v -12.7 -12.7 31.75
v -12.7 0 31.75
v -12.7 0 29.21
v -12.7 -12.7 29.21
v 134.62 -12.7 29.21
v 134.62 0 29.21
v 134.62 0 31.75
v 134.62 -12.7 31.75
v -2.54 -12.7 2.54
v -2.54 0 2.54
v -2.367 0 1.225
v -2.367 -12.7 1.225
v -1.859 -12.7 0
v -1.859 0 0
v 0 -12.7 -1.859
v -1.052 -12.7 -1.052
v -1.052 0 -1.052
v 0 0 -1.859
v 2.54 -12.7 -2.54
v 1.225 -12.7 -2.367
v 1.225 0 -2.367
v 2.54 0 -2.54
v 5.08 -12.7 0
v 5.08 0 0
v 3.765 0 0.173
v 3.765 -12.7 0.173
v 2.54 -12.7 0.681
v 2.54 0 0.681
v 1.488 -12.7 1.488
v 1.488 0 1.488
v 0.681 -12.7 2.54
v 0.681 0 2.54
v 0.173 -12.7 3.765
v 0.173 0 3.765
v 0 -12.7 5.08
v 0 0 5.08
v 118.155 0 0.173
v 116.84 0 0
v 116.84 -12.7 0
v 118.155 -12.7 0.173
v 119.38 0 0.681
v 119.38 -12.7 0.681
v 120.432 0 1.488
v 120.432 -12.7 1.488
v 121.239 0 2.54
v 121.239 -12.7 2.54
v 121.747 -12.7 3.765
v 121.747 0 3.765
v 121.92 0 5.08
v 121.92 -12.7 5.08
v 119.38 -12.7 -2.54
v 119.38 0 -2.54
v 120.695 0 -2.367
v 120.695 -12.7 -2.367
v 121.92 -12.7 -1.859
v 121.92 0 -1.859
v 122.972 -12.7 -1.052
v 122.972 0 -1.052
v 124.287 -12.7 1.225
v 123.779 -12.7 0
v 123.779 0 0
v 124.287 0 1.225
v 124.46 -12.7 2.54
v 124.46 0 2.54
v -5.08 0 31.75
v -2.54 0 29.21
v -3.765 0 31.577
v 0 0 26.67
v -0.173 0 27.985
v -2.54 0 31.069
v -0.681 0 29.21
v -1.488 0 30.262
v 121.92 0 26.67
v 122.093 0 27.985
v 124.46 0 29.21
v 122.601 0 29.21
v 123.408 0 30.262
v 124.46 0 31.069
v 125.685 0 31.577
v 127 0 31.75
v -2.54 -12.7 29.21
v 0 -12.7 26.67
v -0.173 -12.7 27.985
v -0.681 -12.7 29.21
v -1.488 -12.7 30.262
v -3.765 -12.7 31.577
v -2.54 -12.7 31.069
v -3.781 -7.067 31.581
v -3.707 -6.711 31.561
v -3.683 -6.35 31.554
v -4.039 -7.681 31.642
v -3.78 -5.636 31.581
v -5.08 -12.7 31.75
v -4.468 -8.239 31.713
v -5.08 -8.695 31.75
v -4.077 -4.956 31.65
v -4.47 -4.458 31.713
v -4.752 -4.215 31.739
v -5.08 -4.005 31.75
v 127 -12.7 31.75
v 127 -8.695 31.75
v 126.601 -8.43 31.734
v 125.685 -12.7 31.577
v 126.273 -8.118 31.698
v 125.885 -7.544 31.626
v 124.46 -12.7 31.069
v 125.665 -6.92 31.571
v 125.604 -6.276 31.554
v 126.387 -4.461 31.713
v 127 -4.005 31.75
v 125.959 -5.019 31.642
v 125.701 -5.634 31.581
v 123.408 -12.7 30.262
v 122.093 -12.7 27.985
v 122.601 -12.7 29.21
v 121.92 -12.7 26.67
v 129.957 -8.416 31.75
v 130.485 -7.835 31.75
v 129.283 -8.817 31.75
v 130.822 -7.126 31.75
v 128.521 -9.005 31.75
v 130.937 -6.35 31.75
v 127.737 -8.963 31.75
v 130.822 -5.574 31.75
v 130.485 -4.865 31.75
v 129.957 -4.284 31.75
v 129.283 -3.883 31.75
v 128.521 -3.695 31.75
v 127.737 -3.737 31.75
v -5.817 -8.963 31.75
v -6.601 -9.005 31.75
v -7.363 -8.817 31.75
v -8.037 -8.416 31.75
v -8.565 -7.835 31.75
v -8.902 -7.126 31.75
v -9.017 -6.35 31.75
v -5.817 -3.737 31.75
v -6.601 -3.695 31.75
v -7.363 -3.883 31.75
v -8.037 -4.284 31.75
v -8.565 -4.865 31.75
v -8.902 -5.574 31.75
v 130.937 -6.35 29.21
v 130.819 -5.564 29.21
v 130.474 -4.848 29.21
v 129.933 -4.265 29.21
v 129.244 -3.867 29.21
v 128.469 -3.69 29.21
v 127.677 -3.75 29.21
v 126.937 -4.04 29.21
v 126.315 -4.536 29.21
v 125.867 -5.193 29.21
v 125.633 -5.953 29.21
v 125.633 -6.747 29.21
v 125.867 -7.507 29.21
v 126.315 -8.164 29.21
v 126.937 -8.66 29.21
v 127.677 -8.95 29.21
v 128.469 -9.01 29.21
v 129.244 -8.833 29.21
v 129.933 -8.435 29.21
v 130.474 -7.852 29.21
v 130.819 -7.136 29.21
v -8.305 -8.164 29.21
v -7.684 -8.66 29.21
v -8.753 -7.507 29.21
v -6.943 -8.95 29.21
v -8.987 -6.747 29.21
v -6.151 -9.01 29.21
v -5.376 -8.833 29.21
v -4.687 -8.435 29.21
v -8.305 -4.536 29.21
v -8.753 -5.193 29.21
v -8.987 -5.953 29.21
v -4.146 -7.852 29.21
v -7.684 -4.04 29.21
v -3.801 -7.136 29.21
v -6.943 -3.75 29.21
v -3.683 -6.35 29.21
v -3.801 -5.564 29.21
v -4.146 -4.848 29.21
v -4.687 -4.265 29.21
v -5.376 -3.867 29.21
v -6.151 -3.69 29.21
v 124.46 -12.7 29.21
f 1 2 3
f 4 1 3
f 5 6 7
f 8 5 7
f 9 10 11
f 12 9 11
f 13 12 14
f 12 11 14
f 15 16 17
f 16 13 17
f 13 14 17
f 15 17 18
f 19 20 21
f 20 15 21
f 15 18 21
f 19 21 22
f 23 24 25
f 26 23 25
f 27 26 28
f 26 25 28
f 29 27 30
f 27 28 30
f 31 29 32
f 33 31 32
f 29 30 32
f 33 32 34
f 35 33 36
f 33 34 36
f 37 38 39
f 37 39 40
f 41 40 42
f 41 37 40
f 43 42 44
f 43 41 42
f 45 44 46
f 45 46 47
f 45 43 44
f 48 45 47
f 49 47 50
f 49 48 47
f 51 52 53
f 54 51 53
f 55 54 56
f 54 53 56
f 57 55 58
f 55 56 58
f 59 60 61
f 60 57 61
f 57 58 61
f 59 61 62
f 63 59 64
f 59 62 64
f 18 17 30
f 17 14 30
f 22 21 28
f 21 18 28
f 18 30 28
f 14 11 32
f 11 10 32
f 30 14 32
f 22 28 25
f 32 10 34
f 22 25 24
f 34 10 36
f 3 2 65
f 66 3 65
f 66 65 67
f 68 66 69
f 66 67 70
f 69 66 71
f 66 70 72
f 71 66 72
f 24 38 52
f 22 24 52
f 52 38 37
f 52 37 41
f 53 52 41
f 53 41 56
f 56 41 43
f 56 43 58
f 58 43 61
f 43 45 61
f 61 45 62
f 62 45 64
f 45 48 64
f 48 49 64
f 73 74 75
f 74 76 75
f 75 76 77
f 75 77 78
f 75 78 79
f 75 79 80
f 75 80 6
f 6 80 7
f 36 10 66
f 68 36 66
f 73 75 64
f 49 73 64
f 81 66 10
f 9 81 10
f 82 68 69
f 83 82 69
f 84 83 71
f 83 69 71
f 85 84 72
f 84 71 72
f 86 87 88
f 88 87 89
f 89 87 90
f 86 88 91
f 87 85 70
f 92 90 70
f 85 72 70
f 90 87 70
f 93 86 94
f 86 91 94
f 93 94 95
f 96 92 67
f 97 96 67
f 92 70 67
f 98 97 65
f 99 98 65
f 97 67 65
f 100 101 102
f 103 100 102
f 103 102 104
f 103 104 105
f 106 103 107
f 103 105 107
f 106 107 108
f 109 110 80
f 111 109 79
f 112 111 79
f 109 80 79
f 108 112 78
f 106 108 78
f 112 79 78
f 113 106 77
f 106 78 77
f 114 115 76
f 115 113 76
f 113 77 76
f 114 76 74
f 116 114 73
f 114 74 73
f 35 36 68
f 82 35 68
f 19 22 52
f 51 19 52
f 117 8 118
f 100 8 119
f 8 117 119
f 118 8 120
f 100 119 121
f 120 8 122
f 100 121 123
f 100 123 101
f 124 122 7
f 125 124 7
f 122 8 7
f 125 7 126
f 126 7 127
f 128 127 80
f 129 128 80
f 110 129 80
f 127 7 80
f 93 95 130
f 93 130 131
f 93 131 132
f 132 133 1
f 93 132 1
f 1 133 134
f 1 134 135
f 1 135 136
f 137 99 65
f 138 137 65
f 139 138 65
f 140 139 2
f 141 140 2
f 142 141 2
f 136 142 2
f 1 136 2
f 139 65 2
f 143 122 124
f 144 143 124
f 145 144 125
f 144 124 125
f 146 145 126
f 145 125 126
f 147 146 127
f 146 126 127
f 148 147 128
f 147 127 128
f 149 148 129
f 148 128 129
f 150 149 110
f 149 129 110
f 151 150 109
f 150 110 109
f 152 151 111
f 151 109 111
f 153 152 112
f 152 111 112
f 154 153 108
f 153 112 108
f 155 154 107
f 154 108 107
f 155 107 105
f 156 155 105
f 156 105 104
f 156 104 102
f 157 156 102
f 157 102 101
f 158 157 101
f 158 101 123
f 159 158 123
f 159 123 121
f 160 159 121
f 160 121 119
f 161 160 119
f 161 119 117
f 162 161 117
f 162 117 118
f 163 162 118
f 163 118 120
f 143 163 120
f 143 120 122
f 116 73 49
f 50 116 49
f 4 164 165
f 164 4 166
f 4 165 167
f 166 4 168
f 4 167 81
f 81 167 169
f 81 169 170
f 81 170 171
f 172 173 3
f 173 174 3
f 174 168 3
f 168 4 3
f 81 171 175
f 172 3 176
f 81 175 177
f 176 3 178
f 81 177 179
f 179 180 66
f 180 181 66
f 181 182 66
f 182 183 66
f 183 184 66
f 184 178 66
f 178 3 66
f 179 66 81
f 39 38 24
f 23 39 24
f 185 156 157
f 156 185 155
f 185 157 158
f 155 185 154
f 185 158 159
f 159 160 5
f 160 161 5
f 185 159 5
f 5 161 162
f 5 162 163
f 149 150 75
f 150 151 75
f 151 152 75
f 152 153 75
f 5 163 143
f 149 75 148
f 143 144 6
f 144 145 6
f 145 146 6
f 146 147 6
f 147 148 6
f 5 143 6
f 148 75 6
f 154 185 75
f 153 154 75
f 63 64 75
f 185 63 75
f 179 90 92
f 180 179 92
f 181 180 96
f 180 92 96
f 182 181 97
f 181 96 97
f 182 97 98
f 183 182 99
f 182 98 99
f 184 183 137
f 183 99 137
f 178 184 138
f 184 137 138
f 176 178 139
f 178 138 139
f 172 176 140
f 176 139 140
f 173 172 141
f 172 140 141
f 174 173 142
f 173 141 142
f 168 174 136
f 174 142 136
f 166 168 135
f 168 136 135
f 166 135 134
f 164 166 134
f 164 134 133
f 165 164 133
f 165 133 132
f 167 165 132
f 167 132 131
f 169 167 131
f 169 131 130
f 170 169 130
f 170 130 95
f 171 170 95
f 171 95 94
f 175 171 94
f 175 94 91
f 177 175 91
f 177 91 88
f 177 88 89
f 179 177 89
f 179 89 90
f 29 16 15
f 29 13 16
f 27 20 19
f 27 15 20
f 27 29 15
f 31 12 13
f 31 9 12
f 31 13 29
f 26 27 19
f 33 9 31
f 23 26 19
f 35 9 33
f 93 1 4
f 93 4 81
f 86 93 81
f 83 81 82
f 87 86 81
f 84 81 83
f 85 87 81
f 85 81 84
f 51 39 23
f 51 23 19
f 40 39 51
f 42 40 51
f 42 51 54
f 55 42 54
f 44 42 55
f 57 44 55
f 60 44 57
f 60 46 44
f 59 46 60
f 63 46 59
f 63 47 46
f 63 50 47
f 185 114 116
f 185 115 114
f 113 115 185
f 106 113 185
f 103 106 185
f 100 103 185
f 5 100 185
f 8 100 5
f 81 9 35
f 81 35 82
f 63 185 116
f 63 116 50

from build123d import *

# Parameters (mm, degrees)
F1_DEPTH    = 12.7
F2_R        = 2.667
F3_R        = 2.667
F4_DEPTH    = 25.4
F5_T1_DEPTH = 12.7
F5_T3_DEPTH = 38.1


# Not quite as in the source:
# - a fillet or chamfer that OpenCascade refuses, or shapes differently, is made with other operations: its cross-section is extruded or revolved along the edge and cut away or added


with BuildPart() as f1:
    # F0 (on Front) → F1 (new body)
    with BuildSketch(Plane.XZ):
        Polygon((121.92, 0), (0, 0), (0, 31.75), (-12.7, 31.75), (-12.7, 29.2099993676), (-2.5400006324, 29.2099993676), (-2.5400006324, -2.5400006324), (124.4600006324, -2.5400006324), (124.4600006324, 29.2099993676), (134.62, 29.2099993676), (134.62, 31.75), (121.92, 31.75), align=None)
    extrude(amount=F1_DEPTH)

    # F2 (on face) + F3 (on face) → F4 (cut)
    with BuildSketch(Plane.XY.offset(31.75)):
        with Locations((-6.35, -6.35)):
            Circle(F2_R)
    with BuildSketch(Plane.XY.offset(31.75)):
        with Locations((128.27, -6.35)):
            Circle(F3_R)
    extrude(amount=-F4_DEPTH, mode=Mode.SUBTRACT)

    # F5: fillet of radius 5.08 on 6 edges, made by hand

    # F5_s2 → F5_t1 (join)
    with BuildSketch(Plane.XZ):
        with BuildLine():
            ThreePointArc((5.08, 0), (1.4878975516, 1.4878975516), (0, 5.08))
            Line((0, 5.08), (0, 0))
            Line((0, 0), (5.08, 0))
        make_face()
        with BuildLine():
            ThreePointArc((116.84, 0), (120.4321024484, 1.4878975516), (121.92, 5.08))
            Line((121.92, 5.08), (121.92, 0))
            Line((121.92, 0), (116.84, 0))
        make_face()
    extrude(amount=F5_T1_DEPTH)

    # F5_s4 → F5_t3 (cut)
    with BuildSketch(Plane.XZ.offset(-12.7)):
        with BuildLine():
            ThreePointArc((-2.5400006324, 2.5399993676), (-1.0521030808, -1.0521030808), (2.5399993676, -2.5400006324))
            Line((2.5399993676, -2.5400006324), (-2.5400006324, -2.5400006324))
            Line((-2.5400006324, -2.5400006324), (-2.5400006324, 2.5399993676))
        make_face()
        with BuildLine():
            ThreePointArc((119.3800006324, -2.5400006324), (122.9721030808, -1.0521030808), (124.4600006324, 2.5399993676))
            Line((124.4600006324, 2.5399993676), (124.4600006324, -2.5400006324))
            Line((124.4600006324, -2.5400006324), (119.3800006324, -2.5400006324))
        make_face()
        with BuildLine():
            ThreePointArc((127, 31.75), (123.4078975516, 30.2621024484), (121.92, 26.67))
            Line((121.92, 26.67), (121.92, 31.75))
            Line((121.92, 31.75), (127, 31.75))
        make_face()
        with BuildLine():
            ThreePointArc((0, 26.67), (-1.4878975516, 30.2621024484), (-5.08, 31.75))
            Line((-5.08, 31.75), (0, 31.75))
            Line((0, 31.75), (0, 26.67))
        make_face()
    extrude(amount=F5_T3_DEPTH, mode=Mode.SUBTRACT)


solid = f1.part
